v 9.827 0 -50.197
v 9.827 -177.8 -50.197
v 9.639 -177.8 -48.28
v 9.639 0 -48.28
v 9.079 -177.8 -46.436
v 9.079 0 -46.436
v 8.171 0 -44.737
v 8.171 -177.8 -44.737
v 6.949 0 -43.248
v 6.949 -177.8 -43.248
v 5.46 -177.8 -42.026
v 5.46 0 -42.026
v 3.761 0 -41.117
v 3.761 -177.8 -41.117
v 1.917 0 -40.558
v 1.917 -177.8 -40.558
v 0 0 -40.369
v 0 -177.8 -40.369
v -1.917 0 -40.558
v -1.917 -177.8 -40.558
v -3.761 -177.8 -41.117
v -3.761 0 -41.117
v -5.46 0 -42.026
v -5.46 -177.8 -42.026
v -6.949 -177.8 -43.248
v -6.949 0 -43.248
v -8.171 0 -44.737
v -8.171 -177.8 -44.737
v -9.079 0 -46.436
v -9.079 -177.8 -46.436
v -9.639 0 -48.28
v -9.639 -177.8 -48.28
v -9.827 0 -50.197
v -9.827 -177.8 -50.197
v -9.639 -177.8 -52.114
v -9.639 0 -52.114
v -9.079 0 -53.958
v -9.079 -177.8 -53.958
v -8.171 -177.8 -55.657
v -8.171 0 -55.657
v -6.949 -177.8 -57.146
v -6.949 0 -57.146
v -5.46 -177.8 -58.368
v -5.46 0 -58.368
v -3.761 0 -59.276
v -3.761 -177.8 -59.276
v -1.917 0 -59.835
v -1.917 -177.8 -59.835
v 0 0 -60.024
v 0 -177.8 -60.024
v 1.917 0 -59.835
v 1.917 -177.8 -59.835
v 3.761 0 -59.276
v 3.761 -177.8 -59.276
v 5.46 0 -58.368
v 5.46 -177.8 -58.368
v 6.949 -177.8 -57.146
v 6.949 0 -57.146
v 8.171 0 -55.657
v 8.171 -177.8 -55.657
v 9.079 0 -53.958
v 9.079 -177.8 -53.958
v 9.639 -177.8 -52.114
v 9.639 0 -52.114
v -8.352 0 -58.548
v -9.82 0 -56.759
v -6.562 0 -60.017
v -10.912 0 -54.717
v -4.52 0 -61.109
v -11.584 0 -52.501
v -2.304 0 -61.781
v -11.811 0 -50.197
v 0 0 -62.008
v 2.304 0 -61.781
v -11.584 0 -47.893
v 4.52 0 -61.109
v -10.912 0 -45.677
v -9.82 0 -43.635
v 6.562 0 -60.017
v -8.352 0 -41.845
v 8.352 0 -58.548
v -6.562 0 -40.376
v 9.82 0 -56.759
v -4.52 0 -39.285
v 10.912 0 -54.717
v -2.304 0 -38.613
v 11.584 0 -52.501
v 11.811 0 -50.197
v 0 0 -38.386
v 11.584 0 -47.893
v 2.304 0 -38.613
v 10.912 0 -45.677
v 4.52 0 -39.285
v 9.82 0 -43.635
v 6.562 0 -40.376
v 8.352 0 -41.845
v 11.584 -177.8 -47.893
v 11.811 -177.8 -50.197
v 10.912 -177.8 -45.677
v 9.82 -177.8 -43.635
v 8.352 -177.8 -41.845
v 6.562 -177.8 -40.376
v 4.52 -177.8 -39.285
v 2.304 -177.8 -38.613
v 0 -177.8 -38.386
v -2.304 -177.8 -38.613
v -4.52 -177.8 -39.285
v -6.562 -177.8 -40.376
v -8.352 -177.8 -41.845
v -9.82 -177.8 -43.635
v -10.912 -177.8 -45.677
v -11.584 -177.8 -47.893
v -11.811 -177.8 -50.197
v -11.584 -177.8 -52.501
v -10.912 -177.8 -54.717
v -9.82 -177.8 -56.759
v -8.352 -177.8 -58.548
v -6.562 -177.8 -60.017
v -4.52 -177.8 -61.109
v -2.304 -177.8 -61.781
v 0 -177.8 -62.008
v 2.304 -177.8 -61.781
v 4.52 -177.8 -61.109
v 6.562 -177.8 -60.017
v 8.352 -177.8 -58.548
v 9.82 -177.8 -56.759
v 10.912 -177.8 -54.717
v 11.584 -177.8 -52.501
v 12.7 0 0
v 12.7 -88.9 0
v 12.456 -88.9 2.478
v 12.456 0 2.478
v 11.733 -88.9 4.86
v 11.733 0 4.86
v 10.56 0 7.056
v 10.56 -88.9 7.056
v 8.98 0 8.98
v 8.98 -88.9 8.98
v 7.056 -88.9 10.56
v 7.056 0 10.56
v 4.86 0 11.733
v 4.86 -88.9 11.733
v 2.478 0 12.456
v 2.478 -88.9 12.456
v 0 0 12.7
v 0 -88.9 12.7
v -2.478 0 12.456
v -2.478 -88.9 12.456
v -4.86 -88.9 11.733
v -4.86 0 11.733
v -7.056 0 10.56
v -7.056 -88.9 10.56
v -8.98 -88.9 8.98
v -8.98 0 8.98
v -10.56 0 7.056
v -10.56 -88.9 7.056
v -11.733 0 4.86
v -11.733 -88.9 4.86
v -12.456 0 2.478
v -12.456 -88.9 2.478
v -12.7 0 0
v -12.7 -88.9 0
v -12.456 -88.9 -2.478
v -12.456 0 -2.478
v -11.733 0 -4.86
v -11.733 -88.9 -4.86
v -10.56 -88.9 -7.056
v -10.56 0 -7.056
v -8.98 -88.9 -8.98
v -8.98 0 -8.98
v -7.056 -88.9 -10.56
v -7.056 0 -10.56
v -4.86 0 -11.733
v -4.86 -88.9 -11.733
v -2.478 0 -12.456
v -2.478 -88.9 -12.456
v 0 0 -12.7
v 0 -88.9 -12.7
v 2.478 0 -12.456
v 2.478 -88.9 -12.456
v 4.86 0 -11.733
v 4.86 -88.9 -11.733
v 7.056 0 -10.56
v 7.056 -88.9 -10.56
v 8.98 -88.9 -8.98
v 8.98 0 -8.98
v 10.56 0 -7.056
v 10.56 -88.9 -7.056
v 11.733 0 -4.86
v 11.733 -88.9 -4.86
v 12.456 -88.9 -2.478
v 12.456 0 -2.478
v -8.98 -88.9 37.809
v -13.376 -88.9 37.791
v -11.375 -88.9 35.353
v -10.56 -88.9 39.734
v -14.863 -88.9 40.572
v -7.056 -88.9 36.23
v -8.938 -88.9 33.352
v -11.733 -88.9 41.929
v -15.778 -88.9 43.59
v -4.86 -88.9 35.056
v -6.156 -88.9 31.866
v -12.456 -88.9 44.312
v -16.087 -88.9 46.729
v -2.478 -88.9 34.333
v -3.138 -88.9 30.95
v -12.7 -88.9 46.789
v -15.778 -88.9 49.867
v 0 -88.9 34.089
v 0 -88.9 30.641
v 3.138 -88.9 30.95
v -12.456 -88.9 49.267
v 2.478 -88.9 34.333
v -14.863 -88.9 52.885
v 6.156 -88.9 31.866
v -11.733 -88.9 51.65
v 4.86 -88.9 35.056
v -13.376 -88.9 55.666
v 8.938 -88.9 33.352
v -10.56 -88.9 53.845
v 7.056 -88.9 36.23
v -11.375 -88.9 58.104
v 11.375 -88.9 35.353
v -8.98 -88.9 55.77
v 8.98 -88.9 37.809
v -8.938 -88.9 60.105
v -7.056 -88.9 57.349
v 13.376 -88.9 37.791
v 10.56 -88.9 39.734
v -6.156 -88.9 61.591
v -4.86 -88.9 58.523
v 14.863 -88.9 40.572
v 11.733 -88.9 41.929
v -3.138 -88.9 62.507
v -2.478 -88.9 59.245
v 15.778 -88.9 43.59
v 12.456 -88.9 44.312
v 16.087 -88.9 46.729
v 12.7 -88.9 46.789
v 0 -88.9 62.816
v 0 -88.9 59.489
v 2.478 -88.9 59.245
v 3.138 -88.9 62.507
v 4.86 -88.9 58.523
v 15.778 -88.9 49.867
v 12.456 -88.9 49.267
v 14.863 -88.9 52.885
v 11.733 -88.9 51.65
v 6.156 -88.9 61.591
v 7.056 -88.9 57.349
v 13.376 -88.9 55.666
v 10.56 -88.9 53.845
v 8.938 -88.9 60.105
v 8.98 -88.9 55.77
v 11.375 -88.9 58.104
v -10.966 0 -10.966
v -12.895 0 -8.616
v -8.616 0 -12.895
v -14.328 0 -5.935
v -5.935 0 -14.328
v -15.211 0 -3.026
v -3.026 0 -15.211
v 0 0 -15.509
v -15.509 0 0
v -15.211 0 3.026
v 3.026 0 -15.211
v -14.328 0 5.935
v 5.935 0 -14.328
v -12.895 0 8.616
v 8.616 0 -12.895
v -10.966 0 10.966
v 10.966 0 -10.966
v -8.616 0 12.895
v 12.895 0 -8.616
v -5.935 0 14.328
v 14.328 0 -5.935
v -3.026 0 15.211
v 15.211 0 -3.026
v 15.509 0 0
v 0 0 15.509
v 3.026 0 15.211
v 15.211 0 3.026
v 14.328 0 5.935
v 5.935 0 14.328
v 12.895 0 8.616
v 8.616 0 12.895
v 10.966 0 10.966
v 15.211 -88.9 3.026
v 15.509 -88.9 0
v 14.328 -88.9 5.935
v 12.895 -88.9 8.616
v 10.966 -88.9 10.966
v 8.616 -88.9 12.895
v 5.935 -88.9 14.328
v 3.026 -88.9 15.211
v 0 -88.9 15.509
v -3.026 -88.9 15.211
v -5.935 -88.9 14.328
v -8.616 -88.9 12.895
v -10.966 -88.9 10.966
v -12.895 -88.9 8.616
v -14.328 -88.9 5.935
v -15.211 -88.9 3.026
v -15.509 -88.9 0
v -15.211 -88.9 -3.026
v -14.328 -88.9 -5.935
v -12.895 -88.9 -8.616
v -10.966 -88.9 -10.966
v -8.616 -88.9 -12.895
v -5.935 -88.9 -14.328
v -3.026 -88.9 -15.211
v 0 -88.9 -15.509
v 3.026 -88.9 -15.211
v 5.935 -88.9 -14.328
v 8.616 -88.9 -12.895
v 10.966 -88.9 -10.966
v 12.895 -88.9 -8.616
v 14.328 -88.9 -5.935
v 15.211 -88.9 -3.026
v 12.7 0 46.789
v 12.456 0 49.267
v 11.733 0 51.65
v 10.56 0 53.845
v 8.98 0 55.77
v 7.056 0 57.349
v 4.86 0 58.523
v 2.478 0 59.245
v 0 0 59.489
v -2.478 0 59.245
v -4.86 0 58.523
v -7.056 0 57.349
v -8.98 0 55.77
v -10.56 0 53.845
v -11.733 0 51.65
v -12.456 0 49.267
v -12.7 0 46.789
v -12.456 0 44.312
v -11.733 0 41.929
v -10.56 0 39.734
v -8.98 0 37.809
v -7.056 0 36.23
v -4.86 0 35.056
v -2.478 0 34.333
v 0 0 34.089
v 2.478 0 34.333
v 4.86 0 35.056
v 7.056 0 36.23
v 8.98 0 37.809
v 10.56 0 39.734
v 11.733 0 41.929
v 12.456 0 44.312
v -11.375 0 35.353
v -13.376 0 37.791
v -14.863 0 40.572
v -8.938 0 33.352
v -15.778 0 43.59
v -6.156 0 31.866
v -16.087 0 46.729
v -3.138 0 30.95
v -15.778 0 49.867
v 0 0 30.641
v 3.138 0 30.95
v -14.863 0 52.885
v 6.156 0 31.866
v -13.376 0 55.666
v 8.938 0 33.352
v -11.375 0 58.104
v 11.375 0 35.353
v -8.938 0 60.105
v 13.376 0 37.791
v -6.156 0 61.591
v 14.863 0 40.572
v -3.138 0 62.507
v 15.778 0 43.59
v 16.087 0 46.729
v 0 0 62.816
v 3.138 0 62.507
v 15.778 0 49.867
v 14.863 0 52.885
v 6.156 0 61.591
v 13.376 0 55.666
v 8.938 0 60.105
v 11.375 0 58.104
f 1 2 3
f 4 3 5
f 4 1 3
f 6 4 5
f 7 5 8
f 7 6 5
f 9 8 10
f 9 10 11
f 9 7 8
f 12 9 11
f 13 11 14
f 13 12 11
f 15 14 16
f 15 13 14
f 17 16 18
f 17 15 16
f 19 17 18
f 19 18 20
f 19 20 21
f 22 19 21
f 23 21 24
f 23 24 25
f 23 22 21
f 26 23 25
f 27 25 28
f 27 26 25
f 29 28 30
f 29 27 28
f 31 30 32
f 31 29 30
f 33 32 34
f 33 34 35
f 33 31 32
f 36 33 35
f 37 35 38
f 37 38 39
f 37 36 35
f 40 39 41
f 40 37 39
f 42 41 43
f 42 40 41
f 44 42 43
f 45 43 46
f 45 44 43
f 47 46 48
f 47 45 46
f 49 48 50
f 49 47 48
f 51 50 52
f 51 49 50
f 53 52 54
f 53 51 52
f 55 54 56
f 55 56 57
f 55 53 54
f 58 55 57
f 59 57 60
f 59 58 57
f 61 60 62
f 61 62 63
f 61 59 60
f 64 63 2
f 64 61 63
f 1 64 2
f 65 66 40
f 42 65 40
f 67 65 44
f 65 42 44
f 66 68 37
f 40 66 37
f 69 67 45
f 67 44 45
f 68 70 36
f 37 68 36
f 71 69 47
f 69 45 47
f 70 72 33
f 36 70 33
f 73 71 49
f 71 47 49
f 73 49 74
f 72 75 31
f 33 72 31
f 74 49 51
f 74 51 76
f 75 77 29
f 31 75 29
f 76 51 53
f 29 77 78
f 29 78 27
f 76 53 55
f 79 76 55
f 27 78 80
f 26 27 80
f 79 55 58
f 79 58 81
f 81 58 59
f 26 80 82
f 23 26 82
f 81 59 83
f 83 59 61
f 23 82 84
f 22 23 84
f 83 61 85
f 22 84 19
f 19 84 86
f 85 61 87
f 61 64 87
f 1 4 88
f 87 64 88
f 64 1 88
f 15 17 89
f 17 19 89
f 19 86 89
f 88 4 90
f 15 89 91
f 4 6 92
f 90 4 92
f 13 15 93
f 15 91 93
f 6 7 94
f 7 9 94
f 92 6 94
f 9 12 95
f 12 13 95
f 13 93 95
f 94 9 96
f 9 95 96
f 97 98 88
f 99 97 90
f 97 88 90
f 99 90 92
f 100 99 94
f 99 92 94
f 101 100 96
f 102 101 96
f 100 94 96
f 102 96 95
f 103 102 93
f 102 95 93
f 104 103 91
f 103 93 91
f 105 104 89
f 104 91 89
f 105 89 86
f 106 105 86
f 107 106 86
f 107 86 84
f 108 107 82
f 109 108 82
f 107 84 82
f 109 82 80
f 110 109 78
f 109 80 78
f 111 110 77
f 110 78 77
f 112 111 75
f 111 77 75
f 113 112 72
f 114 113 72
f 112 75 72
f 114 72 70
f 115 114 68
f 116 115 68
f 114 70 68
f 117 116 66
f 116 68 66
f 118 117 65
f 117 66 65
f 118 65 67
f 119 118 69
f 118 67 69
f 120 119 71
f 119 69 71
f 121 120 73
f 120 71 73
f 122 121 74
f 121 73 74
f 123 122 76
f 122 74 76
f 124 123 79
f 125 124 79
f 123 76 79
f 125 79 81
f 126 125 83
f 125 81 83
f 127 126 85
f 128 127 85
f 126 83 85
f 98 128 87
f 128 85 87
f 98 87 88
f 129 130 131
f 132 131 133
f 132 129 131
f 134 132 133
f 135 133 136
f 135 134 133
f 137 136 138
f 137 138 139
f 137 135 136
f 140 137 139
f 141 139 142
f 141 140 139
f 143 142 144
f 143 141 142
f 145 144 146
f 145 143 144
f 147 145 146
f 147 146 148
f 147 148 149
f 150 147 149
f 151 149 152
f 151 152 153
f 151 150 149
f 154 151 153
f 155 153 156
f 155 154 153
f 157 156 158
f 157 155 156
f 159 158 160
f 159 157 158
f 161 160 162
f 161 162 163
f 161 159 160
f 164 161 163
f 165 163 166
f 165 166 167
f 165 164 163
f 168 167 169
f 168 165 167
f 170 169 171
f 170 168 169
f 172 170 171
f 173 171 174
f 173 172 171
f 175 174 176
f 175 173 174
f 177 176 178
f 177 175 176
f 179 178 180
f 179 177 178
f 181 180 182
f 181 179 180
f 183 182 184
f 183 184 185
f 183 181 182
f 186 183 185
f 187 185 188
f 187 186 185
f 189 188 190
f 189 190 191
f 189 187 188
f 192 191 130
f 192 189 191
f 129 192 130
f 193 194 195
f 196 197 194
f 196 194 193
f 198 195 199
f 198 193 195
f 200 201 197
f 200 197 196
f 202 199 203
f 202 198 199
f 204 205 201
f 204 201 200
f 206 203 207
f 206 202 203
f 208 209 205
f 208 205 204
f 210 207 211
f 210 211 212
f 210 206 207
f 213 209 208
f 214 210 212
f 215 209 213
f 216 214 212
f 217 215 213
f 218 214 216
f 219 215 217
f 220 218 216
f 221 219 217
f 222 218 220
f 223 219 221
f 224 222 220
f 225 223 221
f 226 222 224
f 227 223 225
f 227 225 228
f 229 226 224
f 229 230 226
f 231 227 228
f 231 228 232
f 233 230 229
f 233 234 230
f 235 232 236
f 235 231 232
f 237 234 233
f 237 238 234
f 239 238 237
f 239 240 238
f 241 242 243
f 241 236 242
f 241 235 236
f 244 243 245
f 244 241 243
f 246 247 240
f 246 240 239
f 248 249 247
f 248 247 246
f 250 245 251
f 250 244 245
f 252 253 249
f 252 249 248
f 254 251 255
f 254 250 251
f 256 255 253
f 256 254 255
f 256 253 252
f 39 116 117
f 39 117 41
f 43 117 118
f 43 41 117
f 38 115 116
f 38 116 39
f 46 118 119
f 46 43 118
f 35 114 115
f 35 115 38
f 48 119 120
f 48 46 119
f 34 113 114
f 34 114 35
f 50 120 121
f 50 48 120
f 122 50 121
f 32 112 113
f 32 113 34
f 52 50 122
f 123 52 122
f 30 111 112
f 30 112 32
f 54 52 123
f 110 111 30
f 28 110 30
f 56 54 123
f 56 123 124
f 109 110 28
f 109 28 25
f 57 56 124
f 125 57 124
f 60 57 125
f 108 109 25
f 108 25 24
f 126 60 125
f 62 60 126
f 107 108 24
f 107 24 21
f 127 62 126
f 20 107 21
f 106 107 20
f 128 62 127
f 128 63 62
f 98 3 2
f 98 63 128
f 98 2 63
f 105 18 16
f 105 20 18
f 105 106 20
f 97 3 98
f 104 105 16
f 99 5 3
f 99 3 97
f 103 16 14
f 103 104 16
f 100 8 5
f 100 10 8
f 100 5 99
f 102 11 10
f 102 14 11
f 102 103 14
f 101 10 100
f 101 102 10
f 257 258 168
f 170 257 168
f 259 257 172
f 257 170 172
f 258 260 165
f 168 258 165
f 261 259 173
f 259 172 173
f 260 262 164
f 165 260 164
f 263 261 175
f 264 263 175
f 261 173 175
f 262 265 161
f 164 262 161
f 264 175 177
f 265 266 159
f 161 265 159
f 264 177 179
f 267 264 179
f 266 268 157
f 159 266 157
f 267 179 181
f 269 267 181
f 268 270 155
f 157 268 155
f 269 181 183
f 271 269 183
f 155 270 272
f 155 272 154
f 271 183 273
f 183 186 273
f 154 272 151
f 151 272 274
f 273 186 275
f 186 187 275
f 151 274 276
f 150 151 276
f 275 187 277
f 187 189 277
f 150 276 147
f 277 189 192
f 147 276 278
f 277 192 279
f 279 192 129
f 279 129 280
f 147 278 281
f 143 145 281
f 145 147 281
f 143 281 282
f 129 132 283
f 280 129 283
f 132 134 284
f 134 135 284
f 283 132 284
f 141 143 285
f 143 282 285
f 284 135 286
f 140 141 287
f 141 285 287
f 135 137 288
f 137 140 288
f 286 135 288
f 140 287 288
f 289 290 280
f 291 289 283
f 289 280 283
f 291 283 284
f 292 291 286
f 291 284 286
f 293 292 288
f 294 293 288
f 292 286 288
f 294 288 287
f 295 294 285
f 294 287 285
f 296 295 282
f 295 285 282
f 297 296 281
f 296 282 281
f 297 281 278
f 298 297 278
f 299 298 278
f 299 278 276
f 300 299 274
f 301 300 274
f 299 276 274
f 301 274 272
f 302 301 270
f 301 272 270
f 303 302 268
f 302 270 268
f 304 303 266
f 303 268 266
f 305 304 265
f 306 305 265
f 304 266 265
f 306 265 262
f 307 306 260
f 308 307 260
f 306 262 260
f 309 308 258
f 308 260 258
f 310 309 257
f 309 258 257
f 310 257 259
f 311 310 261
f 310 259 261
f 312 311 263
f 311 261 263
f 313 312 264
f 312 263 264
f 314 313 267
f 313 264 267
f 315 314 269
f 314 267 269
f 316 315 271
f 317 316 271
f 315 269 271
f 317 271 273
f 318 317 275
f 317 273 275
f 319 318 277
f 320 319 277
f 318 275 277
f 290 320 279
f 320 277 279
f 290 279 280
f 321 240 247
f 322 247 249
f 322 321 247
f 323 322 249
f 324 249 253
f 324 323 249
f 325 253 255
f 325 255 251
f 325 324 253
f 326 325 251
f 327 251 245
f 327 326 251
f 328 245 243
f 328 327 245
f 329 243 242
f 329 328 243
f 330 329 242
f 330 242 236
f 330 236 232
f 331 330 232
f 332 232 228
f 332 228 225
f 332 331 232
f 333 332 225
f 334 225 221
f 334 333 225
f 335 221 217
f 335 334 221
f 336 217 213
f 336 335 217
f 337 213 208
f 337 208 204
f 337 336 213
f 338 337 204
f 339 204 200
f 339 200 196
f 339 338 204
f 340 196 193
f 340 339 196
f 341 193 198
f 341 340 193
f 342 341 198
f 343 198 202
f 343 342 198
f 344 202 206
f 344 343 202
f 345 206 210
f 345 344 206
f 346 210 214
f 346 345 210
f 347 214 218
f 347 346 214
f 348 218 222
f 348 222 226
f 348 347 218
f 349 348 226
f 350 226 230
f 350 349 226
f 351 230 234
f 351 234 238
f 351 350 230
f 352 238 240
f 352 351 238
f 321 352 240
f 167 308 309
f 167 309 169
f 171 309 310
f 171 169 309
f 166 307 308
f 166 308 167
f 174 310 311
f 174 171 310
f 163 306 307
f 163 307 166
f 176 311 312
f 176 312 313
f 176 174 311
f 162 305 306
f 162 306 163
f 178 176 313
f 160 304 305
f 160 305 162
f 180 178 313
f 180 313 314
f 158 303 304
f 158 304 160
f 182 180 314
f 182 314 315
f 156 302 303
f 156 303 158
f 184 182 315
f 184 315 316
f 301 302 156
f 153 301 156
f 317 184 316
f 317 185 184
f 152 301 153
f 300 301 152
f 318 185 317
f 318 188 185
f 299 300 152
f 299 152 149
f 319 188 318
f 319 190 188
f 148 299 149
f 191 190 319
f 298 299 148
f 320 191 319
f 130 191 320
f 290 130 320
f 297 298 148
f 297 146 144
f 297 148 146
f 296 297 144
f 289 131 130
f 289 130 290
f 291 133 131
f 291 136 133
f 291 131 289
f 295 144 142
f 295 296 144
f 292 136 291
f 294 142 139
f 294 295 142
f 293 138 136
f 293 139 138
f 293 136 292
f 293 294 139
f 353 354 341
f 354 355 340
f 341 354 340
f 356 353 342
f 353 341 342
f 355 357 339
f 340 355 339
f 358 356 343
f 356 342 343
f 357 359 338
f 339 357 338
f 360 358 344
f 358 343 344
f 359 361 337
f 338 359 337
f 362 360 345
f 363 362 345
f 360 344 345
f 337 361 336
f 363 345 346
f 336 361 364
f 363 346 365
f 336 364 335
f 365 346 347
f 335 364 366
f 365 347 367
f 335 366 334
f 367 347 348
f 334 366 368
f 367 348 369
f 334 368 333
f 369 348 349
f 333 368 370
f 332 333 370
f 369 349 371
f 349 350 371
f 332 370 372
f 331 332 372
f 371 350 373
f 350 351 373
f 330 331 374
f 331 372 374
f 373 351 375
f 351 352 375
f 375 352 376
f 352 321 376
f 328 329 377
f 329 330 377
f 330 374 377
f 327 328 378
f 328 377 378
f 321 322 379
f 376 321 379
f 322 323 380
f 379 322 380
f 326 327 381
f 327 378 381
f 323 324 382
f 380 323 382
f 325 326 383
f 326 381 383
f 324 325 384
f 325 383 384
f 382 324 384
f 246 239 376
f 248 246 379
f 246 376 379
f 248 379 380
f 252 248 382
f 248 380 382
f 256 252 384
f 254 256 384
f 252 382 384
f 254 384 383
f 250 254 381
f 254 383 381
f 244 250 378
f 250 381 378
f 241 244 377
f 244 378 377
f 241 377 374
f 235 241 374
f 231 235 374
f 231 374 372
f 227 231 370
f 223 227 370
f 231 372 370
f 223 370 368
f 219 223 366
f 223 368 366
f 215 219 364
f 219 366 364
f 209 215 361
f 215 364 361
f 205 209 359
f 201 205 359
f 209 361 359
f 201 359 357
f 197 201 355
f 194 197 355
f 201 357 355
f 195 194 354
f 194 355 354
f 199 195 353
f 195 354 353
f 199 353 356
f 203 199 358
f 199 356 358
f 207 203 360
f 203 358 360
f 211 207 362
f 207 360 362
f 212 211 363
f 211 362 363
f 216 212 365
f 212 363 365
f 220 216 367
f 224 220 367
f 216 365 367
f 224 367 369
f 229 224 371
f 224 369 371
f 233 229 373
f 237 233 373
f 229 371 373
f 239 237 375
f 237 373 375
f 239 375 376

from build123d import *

# Parameters (mm, degrees)
F0_R     = 15.508608
F0_R_2   = 12.7
F1_DEPTH = 88.9
F2_R     = 16.087374
F2_R_2   = 12.7
F3_DEPTH = 88.9
F4_R     = 11.811
F4_R_2   = 9.827442
F5_DEPTH = 177.8


with BuildPart() as f1:
    # F0 (on Front) → F1 (new body)
    with BuildSketch(Plane.XZ):
        Circle(F0_R)
        Circle(F0_R_2, mode=Mode.SUBTRACT)
    extrude(amount=F1_DEPTH)


with BuildPart() as f3:
    # F2 (on Front) → F3 (new body)
    with BuildSketch(Plane.XZ):
        with Locations((-2e-06, 46.728529)):
            Circle(F2_R)
        with Locations((0, 46.789468)):
            Circle(F2_R_2, mode=Mode.SUBTRACT)
    extrude(amount=F3_DEPTH)


with BuildPart() as f5:
    # F4 (on Front) → F5 (new body)
    with BuildSketch(Plane.XZ):
        with Locations((0, -50.196743)):
            Circle(F4_R)
        with Locations((0, -50.196743)):
            Circle(F4_R_2, mode=Mode.SUBTRACT)
    extrude(amount=F5_DEPTH)


solid = Compound([f1.part, f3.part, f5.part])
